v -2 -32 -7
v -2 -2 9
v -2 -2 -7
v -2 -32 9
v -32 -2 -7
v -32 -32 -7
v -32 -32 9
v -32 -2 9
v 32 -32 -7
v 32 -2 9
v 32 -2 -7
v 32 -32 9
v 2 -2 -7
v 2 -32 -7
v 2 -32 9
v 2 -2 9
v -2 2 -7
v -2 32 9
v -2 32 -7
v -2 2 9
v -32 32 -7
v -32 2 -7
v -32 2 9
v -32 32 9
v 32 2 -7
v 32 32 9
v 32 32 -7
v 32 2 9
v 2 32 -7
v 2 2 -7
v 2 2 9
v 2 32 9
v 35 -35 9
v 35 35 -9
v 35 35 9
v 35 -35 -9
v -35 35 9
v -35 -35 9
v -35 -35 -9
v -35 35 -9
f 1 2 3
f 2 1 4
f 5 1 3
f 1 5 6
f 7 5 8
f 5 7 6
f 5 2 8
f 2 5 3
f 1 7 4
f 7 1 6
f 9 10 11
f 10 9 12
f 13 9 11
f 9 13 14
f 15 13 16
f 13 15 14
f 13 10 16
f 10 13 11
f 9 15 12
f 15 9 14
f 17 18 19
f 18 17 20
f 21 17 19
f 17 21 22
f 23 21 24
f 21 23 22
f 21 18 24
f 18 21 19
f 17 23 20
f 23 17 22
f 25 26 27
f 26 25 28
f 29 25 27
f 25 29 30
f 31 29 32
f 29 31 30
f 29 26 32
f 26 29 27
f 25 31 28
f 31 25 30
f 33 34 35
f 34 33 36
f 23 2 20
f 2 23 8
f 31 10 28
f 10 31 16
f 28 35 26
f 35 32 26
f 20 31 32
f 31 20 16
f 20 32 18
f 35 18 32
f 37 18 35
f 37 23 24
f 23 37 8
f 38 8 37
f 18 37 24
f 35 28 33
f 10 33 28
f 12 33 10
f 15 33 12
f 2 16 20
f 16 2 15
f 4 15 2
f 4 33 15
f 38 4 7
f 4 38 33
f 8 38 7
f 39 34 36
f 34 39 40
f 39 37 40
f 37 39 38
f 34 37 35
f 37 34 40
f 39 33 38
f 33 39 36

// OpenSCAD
$fn = 32;

// ----------------------------------------------------------------------
// Pocket plate 70 x 70 x 18
// 2 x 2 pockets 30 mm square, 16 mm deep
// ----------------------------------------------------------------------

// --- parameters (mm) ---
thickness = 18;  // plate thickness
floor_t = 2;     // material left under each pocket
pocket = 30;     // pocket side length
pitch_x = 34;    // pocket pitch along X
pitch_y = 34;    // pocket pitch along Y
cols = 2;        // pockets per row
rows = 2;        // rows of pockets

// --- derived feature positions (mm) ---
depth = thickness - floor_t;        // = 16   pocket depth, down to the floor
span_x = (cols - 1) * pitch_x;      // = 34   distance between outer pockets
span_y = (rows - 1) * pitch_y;      // = 34   distance between outer pocket rows
origin_x = -span_x / 2;             // = -17   X of the first pocket
origin_y = -span_y / 2;             // = -17   Y of the first pocket
plate = [span_x + pocket + 6, span_y + pocket + 6, thickness];  // = [70, 70, 18]   overall size: pockets plus 3 mm of wall on each side
feature_centers = [
  [origin_x + 0 * pitch_x, origin_y + 0 * pitch_y],
  [origin_x + 1 * pitch_x, origin_y + 0 * pitch_y],
  [origin_x + 0 * pitch_x, origin_y + 1 * pitch_y],
  [origin_x + 1 * pitch_x, origin_y + 1 * pitch_y]
];   // pocket centres, used verbatim by the cutter loop

// plate outline, then one pocket per centre in feature_centers
difference() {
  cube(plate, center = true);
  for (centre = feature_centers)
    translate([centre[0] - pocket / 2, centre[1] - pocket / 2, plate[2] / 2 - depth])
      cube([pocket, pocket, depth + 1]);  // centred on the declared pocket centre
}
